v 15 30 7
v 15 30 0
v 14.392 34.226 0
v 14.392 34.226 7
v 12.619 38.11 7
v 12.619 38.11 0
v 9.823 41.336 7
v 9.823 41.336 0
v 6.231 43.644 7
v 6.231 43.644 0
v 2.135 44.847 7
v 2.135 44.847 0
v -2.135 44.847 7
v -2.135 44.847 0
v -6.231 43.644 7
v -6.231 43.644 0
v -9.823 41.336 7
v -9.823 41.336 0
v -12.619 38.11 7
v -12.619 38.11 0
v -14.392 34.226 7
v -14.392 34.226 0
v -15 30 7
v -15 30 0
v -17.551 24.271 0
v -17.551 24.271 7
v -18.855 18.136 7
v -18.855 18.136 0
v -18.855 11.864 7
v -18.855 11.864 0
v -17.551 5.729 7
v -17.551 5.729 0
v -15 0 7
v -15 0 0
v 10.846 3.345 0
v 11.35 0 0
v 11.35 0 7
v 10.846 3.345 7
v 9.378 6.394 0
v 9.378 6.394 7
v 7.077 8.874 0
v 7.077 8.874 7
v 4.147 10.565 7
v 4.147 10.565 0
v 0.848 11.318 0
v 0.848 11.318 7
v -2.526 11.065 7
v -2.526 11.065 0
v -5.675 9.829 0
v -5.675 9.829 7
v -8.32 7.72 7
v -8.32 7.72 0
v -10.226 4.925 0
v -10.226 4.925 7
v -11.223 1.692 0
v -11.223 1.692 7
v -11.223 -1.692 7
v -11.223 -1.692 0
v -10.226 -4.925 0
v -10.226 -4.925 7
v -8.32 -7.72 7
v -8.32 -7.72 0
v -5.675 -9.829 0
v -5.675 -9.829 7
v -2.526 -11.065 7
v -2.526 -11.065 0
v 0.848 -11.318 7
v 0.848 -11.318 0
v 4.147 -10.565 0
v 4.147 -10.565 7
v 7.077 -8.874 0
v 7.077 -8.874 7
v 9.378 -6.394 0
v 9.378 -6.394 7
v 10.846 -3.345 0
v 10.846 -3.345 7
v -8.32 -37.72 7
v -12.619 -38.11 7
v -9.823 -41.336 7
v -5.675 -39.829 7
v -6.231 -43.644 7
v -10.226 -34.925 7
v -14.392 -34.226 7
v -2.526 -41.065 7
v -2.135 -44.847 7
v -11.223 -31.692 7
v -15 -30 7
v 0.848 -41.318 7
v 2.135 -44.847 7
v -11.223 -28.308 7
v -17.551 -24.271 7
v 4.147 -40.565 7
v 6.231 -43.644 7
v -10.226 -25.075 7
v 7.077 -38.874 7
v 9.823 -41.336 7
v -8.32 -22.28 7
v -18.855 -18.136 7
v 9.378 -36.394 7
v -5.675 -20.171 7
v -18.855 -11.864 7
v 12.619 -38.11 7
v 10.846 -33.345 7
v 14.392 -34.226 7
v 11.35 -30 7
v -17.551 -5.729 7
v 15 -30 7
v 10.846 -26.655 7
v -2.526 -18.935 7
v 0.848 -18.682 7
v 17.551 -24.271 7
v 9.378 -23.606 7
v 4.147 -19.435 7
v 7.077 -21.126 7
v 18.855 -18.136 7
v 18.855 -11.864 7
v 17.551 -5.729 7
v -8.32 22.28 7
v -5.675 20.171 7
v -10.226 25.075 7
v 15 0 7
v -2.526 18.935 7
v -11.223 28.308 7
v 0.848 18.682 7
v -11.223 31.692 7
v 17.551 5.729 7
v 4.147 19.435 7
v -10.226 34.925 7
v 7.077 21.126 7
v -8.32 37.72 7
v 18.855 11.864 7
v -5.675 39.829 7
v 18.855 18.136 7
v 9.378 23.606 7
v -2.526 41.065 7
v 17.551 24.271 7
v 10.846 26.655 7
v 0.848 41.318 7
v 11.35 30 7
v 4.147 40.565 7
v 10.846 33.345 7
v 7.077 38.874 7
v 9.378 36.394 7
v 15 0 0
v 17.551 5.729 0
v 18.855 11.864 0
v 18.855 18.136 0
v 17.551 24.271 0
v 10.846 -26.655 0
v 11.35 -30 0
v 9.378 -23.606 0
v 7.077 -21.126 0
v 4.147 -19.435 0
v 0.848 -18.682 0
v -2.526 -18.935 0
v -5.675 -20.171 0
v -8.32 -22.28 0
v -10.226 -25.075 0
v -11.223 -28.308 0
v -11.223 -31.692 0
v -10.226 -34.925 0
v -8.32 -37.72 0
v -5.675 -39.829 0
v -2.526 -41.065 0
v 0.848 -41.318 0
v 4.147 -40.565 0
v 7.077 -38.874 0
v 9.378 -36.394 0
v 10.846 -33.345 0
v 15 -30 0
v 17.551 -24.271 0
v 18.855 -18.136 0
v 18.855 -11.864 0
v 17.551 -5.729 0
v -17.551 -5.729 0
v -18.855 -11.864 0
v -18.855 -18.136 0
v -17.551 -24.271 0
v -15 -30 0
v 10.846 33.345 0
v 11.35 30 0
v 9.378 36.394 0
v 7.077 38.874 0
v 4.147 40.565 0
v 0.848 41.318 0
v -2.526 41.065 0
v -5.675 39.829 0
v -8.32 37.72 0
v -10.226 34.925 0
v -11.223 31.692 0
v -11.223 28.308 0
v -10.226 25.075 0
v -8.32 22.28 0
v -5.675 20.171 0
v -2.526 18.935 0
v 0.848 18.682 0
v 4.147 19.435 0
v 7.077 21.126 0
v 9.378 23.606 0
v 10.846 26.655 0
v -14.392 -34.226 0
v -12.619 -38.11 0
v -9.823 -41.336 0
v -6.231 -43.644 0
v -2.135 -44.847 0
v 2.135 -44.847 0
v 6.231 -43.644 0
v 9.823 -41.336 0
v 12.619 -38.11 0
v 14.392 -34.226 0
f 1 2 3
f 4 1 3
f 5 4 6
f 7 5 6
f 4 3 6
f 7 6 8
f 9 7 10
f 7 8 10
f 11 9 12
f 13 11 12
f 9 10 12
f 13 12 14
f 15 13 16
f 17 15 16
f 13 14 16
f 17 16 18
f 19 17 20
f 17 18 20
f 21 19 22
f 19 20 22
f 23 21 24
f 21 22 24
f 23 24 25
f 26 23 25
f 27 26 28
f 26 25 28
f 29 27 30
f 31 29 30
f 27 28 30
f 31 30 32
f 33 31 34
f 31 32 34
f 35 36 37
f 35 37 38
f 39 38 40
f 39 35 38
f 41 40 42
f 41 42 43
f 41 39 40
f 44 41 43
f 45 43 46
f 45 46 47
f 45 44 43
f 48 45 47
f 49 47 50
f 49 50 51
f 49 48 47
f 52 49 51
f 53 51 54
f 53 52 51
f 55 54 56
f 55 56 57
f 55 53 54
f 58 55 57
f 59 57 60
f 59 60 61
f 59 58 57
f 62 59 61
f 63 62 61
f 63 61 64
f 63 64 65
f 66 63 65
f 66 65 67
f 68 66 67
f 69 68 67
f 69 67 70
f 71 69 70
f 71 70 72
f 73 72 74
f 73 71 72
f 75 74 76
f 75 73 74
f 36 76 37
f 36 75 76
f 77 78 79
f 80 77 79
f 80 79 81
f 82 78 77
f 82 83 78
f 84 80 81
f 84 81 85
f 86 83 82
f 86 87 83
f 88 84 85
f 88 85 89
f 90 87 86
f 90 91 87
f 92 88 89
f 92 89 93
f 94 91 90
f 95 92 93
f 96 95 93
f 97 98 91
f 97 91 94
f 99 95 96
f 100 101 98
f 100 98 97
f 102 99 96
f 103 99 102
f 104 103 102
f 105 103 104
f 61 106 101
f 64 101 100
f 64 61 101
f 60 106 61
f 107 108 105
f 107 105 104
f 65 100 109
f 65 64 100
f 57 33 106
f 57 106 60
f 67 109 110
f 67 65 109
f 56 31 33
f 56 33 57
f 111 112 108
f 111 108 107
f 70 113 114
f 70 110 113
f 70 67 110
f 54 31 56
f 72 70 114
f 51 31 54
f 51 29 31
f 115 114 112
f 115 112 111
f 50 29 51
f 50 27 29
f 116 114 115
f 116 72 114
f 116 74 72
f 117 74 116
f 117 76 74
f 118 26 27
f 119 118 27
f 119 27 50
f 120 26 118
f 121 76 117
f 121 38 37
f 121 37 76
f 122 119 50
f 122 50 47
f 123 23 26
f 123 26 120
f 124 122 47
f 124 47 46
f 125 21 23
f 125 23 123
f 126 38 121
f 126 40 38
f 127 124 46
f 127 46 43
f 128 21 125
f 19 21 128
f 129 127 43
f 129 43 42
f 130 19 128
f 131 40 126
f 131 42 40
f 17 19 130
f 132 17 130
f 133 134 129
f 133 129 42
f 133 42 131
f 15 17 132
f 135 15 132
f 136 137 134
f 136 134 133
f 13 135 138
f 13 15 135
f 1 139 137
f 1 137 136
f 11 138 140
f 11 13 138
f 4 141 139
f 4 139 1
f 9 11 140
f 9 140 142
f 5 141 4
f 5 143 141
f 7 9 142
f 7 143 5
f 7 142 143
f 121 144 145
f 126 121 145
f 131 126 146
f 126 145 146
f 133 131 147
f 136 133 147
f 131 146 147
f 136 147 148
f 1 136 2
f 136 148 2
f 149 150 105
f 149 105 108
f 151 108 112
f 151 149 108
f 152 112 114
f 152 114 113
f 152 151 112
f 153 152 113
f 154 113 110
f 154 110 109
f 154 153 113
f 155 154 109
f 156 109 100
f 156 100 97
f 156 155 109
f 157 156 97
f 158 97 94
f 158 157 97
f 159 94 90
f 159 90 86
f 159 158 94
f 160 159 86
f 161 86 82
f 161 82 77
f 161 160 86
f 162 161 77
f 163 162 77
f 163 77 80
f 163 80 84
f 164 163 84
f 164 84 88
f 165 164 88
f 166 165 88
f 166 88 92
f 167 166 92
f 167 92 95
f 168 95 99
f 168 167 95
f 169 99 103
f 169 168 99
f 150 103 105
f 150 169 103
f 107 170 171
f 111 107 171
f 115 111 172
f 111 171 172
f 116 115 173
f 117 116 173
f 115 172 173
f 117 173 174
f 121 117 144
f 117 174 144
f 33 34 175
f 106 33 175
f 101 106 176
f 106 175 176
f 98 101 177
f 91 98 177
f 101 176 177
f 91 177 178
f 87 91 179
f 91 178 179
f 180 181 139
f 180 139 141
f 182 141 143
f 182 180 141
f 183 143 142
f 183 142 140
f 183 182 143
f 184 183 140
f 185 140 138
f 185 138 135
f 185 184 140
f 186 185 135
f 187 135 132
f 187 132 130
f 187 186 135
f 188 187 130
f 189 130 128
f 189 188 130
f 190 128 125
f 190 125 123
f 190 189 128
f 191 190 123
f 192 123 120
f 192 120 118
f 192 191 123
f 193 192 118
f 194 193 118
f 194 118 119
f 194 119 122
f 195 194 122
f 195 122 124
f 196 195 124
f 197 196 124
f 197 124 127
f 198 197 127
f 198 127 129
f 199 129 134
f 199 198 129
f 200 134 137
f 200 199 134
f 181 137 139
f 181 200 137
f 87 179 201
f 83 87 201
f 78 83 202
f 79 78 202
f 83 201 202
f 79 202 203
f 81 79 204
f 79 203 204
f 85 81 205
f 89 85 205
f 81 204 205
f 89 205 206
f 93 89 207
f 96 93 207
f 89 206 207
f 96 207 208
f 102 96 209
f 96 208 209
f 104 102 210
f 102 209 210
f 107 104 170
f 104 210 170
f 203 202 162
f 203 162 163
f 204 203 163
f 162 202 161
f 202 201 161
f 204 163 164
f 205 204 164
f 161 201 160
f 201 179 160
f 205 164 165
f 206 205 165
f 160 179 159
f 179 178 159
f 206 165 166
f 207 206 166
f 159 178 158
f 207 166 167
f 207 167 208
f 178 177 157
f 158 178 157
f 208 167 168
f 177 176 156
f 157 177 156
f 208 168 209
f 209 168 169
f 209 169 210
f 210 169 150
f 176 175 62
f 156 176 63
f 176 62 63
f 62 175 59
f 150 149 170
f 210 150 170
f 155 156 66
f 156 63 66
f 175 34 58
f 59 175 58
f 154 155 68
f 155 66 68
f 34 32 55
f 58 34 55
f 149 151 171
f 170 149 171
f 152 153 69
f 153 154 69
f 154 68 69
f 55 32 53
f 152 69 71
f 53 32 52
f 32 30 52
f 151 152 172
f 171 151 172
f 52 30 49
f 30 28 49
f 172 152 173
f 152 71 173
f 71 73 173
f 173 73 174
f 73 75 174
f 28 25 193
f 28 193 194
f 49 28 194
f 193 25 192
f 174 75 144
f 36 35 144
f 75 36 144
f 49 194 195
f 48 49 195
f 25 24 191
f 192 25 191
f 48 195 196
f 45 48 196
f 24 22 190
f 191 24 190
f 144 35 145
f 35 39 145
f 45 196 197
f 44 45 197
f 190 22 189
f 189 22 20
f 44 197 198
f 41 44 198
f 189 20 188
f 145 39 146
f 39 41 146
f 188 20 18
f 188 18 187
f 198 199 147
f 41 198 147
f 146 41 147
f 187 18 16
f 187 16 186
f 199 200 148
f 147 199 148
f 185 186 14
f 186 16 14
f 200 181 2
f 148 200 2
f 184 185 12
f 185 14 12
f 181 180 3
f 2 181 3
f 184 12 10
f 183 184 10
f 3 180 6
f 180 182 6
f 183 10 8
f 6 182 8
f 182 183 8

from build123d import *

# Parameters (mm, degrees)
F0_R     = 11.35
F1_DEPTH = 7


# Not quite as in the source:
# - a feature names something its author has since deleted; it is built from what else it names


with BuildPart() as f1:
    # F0 (on Top) → F1 (new body)
    with BuildSketch(Plane.XY):
        with BuildLine():
            ThreePointArc((0, -15), (10.6066017178, -10.6066017178), (15, 0))
            ThreePointArc((15, 0), (10.6066016959, 10.6066017397), (-6.18e-08, 15))
            ThreePointArc((-6.18e-08, 15), (-10.6066017397, 10.6066016959), (-15, 0))
            ThreePointArc((-15, 0), (-10.6066017178, -10.6066017178), (0, -15))
        make_face()
        Circle(F0_R, mode=Mode.SUBTRACT)
        with BuildLine():
            ThreePointArc((15, -30), (19.0192378865, -15), (15, 0))
            ThreePointArc((15, 0), (10.6066017178, -10.6066017178), (0, -15))
            ThreePointArc((0, -15), (10.6066017178, -19.3933982822), (15, -30))
        make_face()
        with BuildLine():
            ThreePointArc((-6.18e-08, 15), (10.6066016959, 10.6066017397), (15, 0))
            ThreePointArc((15, 0), (19.0192378865, 15), (15, 30))
            ThreePointArc((15, 30), (10.6066016959, 19.3933982603), (-6.18e-08, 15))
        make_face()
        with BuildLine():
            ThreePointArc((-15, 0), (-10.6066017397, 10.6066016959), (-6.18e-08, 15))
            ThreePointArc((-6.18e-08, 15), (-10.6066017397, 19.3933983041), (-15, 30))
            ThreePointArc((-15, 30), (-19.0192378865, 15), (-15, 0))
        make_face()
        with BuildLine():
            ThreePointArc((-15, 30), (-10.6066017397, 19.3933983041), (-6.18e-08, 15))
            ThreePointArc((-6.18e-08, 15), (10.6066016959, 19.3933982603), (15, 30))
            ThreePointArc((15, 30), (0, 45), (-15, 30))
        make_face()
        with Locations((0, 30)):
            Circle(F0_R, mode=Mode.SUBTRACT)
        with BuildLine():
            ThreePointArc((-15, -30), (-10.6066017178, -19.3933982822), (0, -15))
            ThreePointArc((0, -15), (-10.6066017178, -10.6066017178), (-15, 0))
            ThreePointArc((-15, 0), (-19.0192378865, -15), (-15, -30))
        make_face()
        with BuildLine():
            ThreePointArc((15, -30), (10.6066017178, -19.3933982822), (0, -15))
            ThreePointArc((0, -15), (-10.6066017178, -19.3933982822), (-15, -30))
            ThreePointArc((-15, -30), (0, -45), (15, -30))
        make_face()
        with Locations((0, -30)):
            Circle(F0_R, mode=Mode.SUBTRACT)
    extrude(amount=F1_DEPTH)


solid = f1.part
